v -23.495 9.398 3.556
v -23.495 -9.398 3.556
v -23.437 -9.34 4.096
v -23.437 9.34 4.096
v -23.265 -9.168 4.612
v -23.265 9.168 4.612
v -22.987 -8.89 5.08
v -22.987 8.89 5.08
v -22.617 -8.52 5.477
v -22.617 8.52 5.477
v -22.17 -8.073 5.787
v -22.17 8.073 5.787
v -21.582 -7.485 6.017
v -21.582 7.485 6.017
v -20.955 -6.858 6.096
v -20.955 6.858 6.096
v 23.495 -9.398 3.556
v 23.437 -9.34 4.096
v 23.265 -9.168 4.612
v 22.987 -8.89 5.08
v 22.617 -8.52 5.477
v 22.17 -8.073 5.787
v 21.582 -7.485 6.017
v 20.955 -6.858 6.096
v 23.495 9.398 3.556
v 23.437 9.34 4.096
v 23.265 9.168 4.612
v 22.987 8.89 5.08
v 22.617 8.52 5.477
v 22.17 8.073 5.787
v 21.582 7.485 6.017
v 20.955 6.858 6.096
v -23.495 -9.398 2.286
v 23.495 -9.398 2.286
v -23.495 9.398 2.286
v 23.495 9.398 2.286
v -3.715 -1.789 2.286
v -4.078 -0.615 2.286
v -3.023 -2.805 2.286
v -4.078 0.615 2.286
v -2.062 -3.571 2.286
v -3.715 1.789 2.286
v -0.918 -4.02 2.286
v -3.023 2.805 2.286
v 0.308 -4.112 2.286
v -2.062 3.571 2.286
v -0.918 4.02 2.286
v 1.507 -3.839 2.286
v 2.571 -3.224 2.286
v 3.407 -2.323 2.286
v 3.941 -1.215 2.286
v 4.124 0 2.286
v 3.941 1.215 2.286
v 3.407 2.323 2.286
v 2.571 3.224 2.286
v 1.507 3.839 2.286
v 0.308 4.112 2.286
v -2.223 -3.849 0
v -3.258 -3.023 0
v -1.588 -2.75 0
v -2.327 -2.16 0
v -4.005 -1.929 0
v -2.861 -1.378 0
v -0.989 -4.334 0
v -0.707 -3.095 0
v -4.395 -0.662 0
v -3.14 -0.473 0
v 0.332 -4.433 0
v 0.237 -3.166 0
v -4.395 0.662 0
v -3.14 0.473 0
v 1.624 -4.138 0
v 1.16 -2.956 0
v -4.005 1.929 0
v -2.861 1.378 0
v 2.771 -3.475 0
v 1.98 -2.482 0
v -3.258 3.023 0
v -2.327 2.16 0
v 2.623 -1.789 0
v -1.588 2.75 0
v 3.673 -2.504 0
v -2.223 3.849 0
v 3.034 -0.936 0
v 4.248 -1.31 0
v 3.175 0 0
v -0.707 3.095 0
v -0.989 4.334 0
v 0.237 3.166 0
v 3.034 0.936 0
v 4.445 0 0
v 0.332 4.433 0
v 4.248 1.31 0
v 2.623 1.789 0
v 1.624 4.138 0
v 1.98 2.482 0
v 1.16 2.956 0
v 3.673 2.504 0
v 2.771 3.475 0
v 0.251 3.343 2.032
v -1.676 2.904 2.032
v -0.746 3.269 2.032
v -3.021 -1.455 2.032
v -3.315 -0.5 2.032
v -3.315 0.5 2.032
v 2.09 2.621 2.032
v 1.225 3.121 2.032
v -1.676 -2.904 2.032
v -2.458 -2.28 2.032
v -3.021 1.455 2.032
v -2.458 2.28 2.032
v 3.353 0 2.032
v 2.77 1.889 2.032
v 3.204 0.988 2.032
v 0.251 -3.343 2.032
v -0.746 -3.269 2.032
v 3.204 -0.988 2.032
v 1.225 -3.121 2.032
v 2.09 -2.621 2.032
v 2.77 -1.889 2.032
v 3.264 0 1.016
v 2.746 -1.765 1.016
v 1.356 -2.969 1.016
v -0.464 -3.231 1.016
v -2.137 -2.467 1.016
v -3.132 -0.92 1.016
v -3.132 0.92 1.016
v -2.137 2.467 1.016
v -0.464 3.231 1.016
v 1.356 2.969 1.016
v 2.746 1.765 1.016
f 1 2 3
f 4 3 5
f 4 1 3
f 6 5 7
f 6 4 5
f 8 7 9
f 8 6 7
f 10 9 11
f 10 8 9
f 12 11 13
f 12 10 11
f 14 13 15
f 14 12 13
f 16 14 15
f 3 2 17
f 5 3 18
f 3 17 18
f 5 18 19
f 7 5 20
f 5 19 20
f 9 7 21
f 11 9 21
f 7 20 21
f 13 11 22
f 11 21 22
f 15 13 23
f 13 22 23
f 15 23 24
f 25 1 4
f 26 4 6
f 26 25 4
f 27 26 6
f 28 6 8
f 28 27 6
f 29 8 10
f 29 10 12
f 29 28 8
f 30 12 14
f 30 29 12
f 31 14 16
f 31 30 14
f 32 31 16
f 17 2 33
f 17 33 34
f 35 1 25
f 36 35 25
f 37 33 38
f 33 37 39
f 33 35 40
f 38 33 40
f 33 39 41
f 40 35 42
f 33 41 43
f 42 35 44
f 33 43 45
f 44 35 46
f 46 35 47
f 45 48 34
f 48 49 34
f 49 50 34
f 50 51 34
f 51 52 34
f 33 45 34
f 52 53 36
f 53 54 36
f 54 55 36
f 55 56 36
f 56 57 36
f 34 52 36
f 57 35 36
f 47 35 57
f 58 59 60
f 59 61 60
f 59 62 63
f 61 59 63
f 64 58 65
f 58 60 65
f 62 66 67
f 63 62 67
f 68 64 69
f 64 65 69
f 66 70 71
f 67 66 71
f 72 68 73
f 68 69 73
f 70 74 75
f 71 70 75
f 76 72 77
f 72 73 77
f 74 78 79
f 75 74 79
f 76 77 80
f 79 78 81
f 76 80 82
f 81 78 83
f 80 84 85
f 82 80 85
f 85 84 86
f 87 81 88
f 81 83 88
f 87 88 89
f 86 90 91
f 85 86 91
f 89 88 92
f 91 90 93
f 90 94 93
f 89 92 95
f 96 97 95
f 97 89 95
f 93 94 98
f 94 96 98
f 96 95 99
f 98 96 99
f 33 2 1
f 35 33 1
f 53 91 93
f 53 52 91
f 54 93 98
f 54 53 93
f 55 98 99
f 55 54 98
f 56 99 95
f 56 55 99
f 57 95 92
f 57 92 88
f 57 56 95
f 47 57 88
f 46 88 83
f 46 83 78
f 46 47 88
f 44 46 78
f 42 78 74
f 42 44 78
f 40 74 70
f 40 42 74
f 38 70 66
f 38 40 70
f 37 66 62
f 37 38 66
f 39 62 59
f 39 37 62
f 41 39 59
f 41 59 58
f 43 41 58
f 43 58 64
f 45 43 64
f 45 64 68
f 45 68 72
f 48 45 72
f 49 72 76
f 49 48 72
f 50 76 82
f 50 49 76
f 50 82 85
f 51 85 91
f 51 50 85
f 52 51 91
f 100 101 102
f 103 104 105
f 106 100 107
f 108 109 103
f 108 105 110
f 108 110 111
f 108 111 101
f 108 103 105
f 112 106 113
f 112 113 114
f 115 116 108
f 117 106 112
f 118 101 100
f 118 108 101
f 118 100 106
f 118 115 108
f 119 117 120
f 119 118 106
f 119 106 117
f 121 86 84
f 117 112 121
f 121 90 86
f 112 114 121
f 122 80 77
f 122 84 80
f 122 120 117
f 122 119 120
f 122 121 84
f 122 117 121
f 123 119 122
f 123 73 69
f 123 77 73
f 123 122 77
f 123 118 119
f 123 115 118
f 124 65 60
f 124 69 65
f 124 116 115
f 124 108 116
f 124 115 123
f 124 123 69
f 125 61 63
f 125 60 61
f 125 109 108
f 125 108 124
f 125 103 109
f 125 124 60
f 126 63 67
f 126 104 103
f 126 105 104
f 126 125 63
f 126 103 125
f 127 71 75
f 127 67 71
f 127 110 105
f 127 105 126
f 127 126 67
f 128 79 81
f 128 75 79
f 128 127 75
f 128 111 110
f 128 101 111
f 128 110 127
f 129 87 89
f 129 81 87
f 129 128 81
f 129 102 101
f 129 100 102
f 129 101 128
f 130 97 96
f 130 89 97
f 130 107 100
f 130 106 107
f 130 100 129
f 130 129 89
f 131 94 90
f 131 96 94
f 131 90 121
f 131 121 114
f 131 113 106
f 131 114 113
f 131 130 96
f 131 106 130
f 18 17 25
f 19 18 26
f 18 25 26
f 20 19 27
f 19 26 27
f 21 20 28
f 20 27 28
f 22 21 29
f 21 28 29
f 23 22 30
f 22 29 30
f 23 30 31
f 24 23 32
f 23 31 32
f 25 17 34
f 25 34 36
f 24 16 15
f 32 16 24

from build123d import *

# Parameters (mm, degrees)
F0_W     = 46.99
F0_H     = 18.796
F1_DEPTH = 6.096
F2_R     = 2.54
F3_W     = 46.99
F3_H     = 18.796
F3_R     = 4.445
F4_DEPTH = 3.556
F4_TAPER = -8
F5_R     = 3.175
F6_DEPTH = 2.032
F6_TAPER = -5
F7_DEPTH = 1.27


with BuildPart() as f1:
    # F0 (on Top) → F1 (new body)
    with BuildSketch(Plane.XY):
        Rectangle(F0_W, F0_H)
    extrude(amount=F1_DEPTH)

    # F2
    f2_edges = [f1.edges().sort_by_distance(p)[0] for p in [
        (-23.495, 0, 6.096),
        (23.495, 0, 6.096),
        (0, -9.398, 6.096),
        (0, 9.398, 6.096),
    ]]
    fillet(f2_edges, radius=F2_R)

    # F3 (on face) → F4 (cut)
    with BuildSketch(Plane(origin=(0, 0, 0), x_dir=(1, 0, 0), z_dir=(0, 0, -1))):
        Rectangle(F3_W, F3_H)
        Circle(F3_R, mode=Mode.SUBTRACT)
    extrude(amount=-F4_DEPTH, taper=F4_TAPER, mode=Mode.SUBTRACT)

    # F5 (on face) → F6 (cut)
    with BuildSketch(Plane(origin=(0, 0, 0), x_dir=(1, 0, 0), z_dir=(0, 0, -1))):
        Circle(F5_R)
    extrude(amount=-F6_DEPTH, taper=F6_TAPER, mode=Mode.SUBTRACT)

    # F7 (add): a face of the model
    f7_faces = [f1.faces().sort_by_distance(p)[0] for p in [
        (22.9889022114, 0, 3.556),
    ]]
    extrude(f7_faces, amount=F7_DEPTH)


solid = f1.part
